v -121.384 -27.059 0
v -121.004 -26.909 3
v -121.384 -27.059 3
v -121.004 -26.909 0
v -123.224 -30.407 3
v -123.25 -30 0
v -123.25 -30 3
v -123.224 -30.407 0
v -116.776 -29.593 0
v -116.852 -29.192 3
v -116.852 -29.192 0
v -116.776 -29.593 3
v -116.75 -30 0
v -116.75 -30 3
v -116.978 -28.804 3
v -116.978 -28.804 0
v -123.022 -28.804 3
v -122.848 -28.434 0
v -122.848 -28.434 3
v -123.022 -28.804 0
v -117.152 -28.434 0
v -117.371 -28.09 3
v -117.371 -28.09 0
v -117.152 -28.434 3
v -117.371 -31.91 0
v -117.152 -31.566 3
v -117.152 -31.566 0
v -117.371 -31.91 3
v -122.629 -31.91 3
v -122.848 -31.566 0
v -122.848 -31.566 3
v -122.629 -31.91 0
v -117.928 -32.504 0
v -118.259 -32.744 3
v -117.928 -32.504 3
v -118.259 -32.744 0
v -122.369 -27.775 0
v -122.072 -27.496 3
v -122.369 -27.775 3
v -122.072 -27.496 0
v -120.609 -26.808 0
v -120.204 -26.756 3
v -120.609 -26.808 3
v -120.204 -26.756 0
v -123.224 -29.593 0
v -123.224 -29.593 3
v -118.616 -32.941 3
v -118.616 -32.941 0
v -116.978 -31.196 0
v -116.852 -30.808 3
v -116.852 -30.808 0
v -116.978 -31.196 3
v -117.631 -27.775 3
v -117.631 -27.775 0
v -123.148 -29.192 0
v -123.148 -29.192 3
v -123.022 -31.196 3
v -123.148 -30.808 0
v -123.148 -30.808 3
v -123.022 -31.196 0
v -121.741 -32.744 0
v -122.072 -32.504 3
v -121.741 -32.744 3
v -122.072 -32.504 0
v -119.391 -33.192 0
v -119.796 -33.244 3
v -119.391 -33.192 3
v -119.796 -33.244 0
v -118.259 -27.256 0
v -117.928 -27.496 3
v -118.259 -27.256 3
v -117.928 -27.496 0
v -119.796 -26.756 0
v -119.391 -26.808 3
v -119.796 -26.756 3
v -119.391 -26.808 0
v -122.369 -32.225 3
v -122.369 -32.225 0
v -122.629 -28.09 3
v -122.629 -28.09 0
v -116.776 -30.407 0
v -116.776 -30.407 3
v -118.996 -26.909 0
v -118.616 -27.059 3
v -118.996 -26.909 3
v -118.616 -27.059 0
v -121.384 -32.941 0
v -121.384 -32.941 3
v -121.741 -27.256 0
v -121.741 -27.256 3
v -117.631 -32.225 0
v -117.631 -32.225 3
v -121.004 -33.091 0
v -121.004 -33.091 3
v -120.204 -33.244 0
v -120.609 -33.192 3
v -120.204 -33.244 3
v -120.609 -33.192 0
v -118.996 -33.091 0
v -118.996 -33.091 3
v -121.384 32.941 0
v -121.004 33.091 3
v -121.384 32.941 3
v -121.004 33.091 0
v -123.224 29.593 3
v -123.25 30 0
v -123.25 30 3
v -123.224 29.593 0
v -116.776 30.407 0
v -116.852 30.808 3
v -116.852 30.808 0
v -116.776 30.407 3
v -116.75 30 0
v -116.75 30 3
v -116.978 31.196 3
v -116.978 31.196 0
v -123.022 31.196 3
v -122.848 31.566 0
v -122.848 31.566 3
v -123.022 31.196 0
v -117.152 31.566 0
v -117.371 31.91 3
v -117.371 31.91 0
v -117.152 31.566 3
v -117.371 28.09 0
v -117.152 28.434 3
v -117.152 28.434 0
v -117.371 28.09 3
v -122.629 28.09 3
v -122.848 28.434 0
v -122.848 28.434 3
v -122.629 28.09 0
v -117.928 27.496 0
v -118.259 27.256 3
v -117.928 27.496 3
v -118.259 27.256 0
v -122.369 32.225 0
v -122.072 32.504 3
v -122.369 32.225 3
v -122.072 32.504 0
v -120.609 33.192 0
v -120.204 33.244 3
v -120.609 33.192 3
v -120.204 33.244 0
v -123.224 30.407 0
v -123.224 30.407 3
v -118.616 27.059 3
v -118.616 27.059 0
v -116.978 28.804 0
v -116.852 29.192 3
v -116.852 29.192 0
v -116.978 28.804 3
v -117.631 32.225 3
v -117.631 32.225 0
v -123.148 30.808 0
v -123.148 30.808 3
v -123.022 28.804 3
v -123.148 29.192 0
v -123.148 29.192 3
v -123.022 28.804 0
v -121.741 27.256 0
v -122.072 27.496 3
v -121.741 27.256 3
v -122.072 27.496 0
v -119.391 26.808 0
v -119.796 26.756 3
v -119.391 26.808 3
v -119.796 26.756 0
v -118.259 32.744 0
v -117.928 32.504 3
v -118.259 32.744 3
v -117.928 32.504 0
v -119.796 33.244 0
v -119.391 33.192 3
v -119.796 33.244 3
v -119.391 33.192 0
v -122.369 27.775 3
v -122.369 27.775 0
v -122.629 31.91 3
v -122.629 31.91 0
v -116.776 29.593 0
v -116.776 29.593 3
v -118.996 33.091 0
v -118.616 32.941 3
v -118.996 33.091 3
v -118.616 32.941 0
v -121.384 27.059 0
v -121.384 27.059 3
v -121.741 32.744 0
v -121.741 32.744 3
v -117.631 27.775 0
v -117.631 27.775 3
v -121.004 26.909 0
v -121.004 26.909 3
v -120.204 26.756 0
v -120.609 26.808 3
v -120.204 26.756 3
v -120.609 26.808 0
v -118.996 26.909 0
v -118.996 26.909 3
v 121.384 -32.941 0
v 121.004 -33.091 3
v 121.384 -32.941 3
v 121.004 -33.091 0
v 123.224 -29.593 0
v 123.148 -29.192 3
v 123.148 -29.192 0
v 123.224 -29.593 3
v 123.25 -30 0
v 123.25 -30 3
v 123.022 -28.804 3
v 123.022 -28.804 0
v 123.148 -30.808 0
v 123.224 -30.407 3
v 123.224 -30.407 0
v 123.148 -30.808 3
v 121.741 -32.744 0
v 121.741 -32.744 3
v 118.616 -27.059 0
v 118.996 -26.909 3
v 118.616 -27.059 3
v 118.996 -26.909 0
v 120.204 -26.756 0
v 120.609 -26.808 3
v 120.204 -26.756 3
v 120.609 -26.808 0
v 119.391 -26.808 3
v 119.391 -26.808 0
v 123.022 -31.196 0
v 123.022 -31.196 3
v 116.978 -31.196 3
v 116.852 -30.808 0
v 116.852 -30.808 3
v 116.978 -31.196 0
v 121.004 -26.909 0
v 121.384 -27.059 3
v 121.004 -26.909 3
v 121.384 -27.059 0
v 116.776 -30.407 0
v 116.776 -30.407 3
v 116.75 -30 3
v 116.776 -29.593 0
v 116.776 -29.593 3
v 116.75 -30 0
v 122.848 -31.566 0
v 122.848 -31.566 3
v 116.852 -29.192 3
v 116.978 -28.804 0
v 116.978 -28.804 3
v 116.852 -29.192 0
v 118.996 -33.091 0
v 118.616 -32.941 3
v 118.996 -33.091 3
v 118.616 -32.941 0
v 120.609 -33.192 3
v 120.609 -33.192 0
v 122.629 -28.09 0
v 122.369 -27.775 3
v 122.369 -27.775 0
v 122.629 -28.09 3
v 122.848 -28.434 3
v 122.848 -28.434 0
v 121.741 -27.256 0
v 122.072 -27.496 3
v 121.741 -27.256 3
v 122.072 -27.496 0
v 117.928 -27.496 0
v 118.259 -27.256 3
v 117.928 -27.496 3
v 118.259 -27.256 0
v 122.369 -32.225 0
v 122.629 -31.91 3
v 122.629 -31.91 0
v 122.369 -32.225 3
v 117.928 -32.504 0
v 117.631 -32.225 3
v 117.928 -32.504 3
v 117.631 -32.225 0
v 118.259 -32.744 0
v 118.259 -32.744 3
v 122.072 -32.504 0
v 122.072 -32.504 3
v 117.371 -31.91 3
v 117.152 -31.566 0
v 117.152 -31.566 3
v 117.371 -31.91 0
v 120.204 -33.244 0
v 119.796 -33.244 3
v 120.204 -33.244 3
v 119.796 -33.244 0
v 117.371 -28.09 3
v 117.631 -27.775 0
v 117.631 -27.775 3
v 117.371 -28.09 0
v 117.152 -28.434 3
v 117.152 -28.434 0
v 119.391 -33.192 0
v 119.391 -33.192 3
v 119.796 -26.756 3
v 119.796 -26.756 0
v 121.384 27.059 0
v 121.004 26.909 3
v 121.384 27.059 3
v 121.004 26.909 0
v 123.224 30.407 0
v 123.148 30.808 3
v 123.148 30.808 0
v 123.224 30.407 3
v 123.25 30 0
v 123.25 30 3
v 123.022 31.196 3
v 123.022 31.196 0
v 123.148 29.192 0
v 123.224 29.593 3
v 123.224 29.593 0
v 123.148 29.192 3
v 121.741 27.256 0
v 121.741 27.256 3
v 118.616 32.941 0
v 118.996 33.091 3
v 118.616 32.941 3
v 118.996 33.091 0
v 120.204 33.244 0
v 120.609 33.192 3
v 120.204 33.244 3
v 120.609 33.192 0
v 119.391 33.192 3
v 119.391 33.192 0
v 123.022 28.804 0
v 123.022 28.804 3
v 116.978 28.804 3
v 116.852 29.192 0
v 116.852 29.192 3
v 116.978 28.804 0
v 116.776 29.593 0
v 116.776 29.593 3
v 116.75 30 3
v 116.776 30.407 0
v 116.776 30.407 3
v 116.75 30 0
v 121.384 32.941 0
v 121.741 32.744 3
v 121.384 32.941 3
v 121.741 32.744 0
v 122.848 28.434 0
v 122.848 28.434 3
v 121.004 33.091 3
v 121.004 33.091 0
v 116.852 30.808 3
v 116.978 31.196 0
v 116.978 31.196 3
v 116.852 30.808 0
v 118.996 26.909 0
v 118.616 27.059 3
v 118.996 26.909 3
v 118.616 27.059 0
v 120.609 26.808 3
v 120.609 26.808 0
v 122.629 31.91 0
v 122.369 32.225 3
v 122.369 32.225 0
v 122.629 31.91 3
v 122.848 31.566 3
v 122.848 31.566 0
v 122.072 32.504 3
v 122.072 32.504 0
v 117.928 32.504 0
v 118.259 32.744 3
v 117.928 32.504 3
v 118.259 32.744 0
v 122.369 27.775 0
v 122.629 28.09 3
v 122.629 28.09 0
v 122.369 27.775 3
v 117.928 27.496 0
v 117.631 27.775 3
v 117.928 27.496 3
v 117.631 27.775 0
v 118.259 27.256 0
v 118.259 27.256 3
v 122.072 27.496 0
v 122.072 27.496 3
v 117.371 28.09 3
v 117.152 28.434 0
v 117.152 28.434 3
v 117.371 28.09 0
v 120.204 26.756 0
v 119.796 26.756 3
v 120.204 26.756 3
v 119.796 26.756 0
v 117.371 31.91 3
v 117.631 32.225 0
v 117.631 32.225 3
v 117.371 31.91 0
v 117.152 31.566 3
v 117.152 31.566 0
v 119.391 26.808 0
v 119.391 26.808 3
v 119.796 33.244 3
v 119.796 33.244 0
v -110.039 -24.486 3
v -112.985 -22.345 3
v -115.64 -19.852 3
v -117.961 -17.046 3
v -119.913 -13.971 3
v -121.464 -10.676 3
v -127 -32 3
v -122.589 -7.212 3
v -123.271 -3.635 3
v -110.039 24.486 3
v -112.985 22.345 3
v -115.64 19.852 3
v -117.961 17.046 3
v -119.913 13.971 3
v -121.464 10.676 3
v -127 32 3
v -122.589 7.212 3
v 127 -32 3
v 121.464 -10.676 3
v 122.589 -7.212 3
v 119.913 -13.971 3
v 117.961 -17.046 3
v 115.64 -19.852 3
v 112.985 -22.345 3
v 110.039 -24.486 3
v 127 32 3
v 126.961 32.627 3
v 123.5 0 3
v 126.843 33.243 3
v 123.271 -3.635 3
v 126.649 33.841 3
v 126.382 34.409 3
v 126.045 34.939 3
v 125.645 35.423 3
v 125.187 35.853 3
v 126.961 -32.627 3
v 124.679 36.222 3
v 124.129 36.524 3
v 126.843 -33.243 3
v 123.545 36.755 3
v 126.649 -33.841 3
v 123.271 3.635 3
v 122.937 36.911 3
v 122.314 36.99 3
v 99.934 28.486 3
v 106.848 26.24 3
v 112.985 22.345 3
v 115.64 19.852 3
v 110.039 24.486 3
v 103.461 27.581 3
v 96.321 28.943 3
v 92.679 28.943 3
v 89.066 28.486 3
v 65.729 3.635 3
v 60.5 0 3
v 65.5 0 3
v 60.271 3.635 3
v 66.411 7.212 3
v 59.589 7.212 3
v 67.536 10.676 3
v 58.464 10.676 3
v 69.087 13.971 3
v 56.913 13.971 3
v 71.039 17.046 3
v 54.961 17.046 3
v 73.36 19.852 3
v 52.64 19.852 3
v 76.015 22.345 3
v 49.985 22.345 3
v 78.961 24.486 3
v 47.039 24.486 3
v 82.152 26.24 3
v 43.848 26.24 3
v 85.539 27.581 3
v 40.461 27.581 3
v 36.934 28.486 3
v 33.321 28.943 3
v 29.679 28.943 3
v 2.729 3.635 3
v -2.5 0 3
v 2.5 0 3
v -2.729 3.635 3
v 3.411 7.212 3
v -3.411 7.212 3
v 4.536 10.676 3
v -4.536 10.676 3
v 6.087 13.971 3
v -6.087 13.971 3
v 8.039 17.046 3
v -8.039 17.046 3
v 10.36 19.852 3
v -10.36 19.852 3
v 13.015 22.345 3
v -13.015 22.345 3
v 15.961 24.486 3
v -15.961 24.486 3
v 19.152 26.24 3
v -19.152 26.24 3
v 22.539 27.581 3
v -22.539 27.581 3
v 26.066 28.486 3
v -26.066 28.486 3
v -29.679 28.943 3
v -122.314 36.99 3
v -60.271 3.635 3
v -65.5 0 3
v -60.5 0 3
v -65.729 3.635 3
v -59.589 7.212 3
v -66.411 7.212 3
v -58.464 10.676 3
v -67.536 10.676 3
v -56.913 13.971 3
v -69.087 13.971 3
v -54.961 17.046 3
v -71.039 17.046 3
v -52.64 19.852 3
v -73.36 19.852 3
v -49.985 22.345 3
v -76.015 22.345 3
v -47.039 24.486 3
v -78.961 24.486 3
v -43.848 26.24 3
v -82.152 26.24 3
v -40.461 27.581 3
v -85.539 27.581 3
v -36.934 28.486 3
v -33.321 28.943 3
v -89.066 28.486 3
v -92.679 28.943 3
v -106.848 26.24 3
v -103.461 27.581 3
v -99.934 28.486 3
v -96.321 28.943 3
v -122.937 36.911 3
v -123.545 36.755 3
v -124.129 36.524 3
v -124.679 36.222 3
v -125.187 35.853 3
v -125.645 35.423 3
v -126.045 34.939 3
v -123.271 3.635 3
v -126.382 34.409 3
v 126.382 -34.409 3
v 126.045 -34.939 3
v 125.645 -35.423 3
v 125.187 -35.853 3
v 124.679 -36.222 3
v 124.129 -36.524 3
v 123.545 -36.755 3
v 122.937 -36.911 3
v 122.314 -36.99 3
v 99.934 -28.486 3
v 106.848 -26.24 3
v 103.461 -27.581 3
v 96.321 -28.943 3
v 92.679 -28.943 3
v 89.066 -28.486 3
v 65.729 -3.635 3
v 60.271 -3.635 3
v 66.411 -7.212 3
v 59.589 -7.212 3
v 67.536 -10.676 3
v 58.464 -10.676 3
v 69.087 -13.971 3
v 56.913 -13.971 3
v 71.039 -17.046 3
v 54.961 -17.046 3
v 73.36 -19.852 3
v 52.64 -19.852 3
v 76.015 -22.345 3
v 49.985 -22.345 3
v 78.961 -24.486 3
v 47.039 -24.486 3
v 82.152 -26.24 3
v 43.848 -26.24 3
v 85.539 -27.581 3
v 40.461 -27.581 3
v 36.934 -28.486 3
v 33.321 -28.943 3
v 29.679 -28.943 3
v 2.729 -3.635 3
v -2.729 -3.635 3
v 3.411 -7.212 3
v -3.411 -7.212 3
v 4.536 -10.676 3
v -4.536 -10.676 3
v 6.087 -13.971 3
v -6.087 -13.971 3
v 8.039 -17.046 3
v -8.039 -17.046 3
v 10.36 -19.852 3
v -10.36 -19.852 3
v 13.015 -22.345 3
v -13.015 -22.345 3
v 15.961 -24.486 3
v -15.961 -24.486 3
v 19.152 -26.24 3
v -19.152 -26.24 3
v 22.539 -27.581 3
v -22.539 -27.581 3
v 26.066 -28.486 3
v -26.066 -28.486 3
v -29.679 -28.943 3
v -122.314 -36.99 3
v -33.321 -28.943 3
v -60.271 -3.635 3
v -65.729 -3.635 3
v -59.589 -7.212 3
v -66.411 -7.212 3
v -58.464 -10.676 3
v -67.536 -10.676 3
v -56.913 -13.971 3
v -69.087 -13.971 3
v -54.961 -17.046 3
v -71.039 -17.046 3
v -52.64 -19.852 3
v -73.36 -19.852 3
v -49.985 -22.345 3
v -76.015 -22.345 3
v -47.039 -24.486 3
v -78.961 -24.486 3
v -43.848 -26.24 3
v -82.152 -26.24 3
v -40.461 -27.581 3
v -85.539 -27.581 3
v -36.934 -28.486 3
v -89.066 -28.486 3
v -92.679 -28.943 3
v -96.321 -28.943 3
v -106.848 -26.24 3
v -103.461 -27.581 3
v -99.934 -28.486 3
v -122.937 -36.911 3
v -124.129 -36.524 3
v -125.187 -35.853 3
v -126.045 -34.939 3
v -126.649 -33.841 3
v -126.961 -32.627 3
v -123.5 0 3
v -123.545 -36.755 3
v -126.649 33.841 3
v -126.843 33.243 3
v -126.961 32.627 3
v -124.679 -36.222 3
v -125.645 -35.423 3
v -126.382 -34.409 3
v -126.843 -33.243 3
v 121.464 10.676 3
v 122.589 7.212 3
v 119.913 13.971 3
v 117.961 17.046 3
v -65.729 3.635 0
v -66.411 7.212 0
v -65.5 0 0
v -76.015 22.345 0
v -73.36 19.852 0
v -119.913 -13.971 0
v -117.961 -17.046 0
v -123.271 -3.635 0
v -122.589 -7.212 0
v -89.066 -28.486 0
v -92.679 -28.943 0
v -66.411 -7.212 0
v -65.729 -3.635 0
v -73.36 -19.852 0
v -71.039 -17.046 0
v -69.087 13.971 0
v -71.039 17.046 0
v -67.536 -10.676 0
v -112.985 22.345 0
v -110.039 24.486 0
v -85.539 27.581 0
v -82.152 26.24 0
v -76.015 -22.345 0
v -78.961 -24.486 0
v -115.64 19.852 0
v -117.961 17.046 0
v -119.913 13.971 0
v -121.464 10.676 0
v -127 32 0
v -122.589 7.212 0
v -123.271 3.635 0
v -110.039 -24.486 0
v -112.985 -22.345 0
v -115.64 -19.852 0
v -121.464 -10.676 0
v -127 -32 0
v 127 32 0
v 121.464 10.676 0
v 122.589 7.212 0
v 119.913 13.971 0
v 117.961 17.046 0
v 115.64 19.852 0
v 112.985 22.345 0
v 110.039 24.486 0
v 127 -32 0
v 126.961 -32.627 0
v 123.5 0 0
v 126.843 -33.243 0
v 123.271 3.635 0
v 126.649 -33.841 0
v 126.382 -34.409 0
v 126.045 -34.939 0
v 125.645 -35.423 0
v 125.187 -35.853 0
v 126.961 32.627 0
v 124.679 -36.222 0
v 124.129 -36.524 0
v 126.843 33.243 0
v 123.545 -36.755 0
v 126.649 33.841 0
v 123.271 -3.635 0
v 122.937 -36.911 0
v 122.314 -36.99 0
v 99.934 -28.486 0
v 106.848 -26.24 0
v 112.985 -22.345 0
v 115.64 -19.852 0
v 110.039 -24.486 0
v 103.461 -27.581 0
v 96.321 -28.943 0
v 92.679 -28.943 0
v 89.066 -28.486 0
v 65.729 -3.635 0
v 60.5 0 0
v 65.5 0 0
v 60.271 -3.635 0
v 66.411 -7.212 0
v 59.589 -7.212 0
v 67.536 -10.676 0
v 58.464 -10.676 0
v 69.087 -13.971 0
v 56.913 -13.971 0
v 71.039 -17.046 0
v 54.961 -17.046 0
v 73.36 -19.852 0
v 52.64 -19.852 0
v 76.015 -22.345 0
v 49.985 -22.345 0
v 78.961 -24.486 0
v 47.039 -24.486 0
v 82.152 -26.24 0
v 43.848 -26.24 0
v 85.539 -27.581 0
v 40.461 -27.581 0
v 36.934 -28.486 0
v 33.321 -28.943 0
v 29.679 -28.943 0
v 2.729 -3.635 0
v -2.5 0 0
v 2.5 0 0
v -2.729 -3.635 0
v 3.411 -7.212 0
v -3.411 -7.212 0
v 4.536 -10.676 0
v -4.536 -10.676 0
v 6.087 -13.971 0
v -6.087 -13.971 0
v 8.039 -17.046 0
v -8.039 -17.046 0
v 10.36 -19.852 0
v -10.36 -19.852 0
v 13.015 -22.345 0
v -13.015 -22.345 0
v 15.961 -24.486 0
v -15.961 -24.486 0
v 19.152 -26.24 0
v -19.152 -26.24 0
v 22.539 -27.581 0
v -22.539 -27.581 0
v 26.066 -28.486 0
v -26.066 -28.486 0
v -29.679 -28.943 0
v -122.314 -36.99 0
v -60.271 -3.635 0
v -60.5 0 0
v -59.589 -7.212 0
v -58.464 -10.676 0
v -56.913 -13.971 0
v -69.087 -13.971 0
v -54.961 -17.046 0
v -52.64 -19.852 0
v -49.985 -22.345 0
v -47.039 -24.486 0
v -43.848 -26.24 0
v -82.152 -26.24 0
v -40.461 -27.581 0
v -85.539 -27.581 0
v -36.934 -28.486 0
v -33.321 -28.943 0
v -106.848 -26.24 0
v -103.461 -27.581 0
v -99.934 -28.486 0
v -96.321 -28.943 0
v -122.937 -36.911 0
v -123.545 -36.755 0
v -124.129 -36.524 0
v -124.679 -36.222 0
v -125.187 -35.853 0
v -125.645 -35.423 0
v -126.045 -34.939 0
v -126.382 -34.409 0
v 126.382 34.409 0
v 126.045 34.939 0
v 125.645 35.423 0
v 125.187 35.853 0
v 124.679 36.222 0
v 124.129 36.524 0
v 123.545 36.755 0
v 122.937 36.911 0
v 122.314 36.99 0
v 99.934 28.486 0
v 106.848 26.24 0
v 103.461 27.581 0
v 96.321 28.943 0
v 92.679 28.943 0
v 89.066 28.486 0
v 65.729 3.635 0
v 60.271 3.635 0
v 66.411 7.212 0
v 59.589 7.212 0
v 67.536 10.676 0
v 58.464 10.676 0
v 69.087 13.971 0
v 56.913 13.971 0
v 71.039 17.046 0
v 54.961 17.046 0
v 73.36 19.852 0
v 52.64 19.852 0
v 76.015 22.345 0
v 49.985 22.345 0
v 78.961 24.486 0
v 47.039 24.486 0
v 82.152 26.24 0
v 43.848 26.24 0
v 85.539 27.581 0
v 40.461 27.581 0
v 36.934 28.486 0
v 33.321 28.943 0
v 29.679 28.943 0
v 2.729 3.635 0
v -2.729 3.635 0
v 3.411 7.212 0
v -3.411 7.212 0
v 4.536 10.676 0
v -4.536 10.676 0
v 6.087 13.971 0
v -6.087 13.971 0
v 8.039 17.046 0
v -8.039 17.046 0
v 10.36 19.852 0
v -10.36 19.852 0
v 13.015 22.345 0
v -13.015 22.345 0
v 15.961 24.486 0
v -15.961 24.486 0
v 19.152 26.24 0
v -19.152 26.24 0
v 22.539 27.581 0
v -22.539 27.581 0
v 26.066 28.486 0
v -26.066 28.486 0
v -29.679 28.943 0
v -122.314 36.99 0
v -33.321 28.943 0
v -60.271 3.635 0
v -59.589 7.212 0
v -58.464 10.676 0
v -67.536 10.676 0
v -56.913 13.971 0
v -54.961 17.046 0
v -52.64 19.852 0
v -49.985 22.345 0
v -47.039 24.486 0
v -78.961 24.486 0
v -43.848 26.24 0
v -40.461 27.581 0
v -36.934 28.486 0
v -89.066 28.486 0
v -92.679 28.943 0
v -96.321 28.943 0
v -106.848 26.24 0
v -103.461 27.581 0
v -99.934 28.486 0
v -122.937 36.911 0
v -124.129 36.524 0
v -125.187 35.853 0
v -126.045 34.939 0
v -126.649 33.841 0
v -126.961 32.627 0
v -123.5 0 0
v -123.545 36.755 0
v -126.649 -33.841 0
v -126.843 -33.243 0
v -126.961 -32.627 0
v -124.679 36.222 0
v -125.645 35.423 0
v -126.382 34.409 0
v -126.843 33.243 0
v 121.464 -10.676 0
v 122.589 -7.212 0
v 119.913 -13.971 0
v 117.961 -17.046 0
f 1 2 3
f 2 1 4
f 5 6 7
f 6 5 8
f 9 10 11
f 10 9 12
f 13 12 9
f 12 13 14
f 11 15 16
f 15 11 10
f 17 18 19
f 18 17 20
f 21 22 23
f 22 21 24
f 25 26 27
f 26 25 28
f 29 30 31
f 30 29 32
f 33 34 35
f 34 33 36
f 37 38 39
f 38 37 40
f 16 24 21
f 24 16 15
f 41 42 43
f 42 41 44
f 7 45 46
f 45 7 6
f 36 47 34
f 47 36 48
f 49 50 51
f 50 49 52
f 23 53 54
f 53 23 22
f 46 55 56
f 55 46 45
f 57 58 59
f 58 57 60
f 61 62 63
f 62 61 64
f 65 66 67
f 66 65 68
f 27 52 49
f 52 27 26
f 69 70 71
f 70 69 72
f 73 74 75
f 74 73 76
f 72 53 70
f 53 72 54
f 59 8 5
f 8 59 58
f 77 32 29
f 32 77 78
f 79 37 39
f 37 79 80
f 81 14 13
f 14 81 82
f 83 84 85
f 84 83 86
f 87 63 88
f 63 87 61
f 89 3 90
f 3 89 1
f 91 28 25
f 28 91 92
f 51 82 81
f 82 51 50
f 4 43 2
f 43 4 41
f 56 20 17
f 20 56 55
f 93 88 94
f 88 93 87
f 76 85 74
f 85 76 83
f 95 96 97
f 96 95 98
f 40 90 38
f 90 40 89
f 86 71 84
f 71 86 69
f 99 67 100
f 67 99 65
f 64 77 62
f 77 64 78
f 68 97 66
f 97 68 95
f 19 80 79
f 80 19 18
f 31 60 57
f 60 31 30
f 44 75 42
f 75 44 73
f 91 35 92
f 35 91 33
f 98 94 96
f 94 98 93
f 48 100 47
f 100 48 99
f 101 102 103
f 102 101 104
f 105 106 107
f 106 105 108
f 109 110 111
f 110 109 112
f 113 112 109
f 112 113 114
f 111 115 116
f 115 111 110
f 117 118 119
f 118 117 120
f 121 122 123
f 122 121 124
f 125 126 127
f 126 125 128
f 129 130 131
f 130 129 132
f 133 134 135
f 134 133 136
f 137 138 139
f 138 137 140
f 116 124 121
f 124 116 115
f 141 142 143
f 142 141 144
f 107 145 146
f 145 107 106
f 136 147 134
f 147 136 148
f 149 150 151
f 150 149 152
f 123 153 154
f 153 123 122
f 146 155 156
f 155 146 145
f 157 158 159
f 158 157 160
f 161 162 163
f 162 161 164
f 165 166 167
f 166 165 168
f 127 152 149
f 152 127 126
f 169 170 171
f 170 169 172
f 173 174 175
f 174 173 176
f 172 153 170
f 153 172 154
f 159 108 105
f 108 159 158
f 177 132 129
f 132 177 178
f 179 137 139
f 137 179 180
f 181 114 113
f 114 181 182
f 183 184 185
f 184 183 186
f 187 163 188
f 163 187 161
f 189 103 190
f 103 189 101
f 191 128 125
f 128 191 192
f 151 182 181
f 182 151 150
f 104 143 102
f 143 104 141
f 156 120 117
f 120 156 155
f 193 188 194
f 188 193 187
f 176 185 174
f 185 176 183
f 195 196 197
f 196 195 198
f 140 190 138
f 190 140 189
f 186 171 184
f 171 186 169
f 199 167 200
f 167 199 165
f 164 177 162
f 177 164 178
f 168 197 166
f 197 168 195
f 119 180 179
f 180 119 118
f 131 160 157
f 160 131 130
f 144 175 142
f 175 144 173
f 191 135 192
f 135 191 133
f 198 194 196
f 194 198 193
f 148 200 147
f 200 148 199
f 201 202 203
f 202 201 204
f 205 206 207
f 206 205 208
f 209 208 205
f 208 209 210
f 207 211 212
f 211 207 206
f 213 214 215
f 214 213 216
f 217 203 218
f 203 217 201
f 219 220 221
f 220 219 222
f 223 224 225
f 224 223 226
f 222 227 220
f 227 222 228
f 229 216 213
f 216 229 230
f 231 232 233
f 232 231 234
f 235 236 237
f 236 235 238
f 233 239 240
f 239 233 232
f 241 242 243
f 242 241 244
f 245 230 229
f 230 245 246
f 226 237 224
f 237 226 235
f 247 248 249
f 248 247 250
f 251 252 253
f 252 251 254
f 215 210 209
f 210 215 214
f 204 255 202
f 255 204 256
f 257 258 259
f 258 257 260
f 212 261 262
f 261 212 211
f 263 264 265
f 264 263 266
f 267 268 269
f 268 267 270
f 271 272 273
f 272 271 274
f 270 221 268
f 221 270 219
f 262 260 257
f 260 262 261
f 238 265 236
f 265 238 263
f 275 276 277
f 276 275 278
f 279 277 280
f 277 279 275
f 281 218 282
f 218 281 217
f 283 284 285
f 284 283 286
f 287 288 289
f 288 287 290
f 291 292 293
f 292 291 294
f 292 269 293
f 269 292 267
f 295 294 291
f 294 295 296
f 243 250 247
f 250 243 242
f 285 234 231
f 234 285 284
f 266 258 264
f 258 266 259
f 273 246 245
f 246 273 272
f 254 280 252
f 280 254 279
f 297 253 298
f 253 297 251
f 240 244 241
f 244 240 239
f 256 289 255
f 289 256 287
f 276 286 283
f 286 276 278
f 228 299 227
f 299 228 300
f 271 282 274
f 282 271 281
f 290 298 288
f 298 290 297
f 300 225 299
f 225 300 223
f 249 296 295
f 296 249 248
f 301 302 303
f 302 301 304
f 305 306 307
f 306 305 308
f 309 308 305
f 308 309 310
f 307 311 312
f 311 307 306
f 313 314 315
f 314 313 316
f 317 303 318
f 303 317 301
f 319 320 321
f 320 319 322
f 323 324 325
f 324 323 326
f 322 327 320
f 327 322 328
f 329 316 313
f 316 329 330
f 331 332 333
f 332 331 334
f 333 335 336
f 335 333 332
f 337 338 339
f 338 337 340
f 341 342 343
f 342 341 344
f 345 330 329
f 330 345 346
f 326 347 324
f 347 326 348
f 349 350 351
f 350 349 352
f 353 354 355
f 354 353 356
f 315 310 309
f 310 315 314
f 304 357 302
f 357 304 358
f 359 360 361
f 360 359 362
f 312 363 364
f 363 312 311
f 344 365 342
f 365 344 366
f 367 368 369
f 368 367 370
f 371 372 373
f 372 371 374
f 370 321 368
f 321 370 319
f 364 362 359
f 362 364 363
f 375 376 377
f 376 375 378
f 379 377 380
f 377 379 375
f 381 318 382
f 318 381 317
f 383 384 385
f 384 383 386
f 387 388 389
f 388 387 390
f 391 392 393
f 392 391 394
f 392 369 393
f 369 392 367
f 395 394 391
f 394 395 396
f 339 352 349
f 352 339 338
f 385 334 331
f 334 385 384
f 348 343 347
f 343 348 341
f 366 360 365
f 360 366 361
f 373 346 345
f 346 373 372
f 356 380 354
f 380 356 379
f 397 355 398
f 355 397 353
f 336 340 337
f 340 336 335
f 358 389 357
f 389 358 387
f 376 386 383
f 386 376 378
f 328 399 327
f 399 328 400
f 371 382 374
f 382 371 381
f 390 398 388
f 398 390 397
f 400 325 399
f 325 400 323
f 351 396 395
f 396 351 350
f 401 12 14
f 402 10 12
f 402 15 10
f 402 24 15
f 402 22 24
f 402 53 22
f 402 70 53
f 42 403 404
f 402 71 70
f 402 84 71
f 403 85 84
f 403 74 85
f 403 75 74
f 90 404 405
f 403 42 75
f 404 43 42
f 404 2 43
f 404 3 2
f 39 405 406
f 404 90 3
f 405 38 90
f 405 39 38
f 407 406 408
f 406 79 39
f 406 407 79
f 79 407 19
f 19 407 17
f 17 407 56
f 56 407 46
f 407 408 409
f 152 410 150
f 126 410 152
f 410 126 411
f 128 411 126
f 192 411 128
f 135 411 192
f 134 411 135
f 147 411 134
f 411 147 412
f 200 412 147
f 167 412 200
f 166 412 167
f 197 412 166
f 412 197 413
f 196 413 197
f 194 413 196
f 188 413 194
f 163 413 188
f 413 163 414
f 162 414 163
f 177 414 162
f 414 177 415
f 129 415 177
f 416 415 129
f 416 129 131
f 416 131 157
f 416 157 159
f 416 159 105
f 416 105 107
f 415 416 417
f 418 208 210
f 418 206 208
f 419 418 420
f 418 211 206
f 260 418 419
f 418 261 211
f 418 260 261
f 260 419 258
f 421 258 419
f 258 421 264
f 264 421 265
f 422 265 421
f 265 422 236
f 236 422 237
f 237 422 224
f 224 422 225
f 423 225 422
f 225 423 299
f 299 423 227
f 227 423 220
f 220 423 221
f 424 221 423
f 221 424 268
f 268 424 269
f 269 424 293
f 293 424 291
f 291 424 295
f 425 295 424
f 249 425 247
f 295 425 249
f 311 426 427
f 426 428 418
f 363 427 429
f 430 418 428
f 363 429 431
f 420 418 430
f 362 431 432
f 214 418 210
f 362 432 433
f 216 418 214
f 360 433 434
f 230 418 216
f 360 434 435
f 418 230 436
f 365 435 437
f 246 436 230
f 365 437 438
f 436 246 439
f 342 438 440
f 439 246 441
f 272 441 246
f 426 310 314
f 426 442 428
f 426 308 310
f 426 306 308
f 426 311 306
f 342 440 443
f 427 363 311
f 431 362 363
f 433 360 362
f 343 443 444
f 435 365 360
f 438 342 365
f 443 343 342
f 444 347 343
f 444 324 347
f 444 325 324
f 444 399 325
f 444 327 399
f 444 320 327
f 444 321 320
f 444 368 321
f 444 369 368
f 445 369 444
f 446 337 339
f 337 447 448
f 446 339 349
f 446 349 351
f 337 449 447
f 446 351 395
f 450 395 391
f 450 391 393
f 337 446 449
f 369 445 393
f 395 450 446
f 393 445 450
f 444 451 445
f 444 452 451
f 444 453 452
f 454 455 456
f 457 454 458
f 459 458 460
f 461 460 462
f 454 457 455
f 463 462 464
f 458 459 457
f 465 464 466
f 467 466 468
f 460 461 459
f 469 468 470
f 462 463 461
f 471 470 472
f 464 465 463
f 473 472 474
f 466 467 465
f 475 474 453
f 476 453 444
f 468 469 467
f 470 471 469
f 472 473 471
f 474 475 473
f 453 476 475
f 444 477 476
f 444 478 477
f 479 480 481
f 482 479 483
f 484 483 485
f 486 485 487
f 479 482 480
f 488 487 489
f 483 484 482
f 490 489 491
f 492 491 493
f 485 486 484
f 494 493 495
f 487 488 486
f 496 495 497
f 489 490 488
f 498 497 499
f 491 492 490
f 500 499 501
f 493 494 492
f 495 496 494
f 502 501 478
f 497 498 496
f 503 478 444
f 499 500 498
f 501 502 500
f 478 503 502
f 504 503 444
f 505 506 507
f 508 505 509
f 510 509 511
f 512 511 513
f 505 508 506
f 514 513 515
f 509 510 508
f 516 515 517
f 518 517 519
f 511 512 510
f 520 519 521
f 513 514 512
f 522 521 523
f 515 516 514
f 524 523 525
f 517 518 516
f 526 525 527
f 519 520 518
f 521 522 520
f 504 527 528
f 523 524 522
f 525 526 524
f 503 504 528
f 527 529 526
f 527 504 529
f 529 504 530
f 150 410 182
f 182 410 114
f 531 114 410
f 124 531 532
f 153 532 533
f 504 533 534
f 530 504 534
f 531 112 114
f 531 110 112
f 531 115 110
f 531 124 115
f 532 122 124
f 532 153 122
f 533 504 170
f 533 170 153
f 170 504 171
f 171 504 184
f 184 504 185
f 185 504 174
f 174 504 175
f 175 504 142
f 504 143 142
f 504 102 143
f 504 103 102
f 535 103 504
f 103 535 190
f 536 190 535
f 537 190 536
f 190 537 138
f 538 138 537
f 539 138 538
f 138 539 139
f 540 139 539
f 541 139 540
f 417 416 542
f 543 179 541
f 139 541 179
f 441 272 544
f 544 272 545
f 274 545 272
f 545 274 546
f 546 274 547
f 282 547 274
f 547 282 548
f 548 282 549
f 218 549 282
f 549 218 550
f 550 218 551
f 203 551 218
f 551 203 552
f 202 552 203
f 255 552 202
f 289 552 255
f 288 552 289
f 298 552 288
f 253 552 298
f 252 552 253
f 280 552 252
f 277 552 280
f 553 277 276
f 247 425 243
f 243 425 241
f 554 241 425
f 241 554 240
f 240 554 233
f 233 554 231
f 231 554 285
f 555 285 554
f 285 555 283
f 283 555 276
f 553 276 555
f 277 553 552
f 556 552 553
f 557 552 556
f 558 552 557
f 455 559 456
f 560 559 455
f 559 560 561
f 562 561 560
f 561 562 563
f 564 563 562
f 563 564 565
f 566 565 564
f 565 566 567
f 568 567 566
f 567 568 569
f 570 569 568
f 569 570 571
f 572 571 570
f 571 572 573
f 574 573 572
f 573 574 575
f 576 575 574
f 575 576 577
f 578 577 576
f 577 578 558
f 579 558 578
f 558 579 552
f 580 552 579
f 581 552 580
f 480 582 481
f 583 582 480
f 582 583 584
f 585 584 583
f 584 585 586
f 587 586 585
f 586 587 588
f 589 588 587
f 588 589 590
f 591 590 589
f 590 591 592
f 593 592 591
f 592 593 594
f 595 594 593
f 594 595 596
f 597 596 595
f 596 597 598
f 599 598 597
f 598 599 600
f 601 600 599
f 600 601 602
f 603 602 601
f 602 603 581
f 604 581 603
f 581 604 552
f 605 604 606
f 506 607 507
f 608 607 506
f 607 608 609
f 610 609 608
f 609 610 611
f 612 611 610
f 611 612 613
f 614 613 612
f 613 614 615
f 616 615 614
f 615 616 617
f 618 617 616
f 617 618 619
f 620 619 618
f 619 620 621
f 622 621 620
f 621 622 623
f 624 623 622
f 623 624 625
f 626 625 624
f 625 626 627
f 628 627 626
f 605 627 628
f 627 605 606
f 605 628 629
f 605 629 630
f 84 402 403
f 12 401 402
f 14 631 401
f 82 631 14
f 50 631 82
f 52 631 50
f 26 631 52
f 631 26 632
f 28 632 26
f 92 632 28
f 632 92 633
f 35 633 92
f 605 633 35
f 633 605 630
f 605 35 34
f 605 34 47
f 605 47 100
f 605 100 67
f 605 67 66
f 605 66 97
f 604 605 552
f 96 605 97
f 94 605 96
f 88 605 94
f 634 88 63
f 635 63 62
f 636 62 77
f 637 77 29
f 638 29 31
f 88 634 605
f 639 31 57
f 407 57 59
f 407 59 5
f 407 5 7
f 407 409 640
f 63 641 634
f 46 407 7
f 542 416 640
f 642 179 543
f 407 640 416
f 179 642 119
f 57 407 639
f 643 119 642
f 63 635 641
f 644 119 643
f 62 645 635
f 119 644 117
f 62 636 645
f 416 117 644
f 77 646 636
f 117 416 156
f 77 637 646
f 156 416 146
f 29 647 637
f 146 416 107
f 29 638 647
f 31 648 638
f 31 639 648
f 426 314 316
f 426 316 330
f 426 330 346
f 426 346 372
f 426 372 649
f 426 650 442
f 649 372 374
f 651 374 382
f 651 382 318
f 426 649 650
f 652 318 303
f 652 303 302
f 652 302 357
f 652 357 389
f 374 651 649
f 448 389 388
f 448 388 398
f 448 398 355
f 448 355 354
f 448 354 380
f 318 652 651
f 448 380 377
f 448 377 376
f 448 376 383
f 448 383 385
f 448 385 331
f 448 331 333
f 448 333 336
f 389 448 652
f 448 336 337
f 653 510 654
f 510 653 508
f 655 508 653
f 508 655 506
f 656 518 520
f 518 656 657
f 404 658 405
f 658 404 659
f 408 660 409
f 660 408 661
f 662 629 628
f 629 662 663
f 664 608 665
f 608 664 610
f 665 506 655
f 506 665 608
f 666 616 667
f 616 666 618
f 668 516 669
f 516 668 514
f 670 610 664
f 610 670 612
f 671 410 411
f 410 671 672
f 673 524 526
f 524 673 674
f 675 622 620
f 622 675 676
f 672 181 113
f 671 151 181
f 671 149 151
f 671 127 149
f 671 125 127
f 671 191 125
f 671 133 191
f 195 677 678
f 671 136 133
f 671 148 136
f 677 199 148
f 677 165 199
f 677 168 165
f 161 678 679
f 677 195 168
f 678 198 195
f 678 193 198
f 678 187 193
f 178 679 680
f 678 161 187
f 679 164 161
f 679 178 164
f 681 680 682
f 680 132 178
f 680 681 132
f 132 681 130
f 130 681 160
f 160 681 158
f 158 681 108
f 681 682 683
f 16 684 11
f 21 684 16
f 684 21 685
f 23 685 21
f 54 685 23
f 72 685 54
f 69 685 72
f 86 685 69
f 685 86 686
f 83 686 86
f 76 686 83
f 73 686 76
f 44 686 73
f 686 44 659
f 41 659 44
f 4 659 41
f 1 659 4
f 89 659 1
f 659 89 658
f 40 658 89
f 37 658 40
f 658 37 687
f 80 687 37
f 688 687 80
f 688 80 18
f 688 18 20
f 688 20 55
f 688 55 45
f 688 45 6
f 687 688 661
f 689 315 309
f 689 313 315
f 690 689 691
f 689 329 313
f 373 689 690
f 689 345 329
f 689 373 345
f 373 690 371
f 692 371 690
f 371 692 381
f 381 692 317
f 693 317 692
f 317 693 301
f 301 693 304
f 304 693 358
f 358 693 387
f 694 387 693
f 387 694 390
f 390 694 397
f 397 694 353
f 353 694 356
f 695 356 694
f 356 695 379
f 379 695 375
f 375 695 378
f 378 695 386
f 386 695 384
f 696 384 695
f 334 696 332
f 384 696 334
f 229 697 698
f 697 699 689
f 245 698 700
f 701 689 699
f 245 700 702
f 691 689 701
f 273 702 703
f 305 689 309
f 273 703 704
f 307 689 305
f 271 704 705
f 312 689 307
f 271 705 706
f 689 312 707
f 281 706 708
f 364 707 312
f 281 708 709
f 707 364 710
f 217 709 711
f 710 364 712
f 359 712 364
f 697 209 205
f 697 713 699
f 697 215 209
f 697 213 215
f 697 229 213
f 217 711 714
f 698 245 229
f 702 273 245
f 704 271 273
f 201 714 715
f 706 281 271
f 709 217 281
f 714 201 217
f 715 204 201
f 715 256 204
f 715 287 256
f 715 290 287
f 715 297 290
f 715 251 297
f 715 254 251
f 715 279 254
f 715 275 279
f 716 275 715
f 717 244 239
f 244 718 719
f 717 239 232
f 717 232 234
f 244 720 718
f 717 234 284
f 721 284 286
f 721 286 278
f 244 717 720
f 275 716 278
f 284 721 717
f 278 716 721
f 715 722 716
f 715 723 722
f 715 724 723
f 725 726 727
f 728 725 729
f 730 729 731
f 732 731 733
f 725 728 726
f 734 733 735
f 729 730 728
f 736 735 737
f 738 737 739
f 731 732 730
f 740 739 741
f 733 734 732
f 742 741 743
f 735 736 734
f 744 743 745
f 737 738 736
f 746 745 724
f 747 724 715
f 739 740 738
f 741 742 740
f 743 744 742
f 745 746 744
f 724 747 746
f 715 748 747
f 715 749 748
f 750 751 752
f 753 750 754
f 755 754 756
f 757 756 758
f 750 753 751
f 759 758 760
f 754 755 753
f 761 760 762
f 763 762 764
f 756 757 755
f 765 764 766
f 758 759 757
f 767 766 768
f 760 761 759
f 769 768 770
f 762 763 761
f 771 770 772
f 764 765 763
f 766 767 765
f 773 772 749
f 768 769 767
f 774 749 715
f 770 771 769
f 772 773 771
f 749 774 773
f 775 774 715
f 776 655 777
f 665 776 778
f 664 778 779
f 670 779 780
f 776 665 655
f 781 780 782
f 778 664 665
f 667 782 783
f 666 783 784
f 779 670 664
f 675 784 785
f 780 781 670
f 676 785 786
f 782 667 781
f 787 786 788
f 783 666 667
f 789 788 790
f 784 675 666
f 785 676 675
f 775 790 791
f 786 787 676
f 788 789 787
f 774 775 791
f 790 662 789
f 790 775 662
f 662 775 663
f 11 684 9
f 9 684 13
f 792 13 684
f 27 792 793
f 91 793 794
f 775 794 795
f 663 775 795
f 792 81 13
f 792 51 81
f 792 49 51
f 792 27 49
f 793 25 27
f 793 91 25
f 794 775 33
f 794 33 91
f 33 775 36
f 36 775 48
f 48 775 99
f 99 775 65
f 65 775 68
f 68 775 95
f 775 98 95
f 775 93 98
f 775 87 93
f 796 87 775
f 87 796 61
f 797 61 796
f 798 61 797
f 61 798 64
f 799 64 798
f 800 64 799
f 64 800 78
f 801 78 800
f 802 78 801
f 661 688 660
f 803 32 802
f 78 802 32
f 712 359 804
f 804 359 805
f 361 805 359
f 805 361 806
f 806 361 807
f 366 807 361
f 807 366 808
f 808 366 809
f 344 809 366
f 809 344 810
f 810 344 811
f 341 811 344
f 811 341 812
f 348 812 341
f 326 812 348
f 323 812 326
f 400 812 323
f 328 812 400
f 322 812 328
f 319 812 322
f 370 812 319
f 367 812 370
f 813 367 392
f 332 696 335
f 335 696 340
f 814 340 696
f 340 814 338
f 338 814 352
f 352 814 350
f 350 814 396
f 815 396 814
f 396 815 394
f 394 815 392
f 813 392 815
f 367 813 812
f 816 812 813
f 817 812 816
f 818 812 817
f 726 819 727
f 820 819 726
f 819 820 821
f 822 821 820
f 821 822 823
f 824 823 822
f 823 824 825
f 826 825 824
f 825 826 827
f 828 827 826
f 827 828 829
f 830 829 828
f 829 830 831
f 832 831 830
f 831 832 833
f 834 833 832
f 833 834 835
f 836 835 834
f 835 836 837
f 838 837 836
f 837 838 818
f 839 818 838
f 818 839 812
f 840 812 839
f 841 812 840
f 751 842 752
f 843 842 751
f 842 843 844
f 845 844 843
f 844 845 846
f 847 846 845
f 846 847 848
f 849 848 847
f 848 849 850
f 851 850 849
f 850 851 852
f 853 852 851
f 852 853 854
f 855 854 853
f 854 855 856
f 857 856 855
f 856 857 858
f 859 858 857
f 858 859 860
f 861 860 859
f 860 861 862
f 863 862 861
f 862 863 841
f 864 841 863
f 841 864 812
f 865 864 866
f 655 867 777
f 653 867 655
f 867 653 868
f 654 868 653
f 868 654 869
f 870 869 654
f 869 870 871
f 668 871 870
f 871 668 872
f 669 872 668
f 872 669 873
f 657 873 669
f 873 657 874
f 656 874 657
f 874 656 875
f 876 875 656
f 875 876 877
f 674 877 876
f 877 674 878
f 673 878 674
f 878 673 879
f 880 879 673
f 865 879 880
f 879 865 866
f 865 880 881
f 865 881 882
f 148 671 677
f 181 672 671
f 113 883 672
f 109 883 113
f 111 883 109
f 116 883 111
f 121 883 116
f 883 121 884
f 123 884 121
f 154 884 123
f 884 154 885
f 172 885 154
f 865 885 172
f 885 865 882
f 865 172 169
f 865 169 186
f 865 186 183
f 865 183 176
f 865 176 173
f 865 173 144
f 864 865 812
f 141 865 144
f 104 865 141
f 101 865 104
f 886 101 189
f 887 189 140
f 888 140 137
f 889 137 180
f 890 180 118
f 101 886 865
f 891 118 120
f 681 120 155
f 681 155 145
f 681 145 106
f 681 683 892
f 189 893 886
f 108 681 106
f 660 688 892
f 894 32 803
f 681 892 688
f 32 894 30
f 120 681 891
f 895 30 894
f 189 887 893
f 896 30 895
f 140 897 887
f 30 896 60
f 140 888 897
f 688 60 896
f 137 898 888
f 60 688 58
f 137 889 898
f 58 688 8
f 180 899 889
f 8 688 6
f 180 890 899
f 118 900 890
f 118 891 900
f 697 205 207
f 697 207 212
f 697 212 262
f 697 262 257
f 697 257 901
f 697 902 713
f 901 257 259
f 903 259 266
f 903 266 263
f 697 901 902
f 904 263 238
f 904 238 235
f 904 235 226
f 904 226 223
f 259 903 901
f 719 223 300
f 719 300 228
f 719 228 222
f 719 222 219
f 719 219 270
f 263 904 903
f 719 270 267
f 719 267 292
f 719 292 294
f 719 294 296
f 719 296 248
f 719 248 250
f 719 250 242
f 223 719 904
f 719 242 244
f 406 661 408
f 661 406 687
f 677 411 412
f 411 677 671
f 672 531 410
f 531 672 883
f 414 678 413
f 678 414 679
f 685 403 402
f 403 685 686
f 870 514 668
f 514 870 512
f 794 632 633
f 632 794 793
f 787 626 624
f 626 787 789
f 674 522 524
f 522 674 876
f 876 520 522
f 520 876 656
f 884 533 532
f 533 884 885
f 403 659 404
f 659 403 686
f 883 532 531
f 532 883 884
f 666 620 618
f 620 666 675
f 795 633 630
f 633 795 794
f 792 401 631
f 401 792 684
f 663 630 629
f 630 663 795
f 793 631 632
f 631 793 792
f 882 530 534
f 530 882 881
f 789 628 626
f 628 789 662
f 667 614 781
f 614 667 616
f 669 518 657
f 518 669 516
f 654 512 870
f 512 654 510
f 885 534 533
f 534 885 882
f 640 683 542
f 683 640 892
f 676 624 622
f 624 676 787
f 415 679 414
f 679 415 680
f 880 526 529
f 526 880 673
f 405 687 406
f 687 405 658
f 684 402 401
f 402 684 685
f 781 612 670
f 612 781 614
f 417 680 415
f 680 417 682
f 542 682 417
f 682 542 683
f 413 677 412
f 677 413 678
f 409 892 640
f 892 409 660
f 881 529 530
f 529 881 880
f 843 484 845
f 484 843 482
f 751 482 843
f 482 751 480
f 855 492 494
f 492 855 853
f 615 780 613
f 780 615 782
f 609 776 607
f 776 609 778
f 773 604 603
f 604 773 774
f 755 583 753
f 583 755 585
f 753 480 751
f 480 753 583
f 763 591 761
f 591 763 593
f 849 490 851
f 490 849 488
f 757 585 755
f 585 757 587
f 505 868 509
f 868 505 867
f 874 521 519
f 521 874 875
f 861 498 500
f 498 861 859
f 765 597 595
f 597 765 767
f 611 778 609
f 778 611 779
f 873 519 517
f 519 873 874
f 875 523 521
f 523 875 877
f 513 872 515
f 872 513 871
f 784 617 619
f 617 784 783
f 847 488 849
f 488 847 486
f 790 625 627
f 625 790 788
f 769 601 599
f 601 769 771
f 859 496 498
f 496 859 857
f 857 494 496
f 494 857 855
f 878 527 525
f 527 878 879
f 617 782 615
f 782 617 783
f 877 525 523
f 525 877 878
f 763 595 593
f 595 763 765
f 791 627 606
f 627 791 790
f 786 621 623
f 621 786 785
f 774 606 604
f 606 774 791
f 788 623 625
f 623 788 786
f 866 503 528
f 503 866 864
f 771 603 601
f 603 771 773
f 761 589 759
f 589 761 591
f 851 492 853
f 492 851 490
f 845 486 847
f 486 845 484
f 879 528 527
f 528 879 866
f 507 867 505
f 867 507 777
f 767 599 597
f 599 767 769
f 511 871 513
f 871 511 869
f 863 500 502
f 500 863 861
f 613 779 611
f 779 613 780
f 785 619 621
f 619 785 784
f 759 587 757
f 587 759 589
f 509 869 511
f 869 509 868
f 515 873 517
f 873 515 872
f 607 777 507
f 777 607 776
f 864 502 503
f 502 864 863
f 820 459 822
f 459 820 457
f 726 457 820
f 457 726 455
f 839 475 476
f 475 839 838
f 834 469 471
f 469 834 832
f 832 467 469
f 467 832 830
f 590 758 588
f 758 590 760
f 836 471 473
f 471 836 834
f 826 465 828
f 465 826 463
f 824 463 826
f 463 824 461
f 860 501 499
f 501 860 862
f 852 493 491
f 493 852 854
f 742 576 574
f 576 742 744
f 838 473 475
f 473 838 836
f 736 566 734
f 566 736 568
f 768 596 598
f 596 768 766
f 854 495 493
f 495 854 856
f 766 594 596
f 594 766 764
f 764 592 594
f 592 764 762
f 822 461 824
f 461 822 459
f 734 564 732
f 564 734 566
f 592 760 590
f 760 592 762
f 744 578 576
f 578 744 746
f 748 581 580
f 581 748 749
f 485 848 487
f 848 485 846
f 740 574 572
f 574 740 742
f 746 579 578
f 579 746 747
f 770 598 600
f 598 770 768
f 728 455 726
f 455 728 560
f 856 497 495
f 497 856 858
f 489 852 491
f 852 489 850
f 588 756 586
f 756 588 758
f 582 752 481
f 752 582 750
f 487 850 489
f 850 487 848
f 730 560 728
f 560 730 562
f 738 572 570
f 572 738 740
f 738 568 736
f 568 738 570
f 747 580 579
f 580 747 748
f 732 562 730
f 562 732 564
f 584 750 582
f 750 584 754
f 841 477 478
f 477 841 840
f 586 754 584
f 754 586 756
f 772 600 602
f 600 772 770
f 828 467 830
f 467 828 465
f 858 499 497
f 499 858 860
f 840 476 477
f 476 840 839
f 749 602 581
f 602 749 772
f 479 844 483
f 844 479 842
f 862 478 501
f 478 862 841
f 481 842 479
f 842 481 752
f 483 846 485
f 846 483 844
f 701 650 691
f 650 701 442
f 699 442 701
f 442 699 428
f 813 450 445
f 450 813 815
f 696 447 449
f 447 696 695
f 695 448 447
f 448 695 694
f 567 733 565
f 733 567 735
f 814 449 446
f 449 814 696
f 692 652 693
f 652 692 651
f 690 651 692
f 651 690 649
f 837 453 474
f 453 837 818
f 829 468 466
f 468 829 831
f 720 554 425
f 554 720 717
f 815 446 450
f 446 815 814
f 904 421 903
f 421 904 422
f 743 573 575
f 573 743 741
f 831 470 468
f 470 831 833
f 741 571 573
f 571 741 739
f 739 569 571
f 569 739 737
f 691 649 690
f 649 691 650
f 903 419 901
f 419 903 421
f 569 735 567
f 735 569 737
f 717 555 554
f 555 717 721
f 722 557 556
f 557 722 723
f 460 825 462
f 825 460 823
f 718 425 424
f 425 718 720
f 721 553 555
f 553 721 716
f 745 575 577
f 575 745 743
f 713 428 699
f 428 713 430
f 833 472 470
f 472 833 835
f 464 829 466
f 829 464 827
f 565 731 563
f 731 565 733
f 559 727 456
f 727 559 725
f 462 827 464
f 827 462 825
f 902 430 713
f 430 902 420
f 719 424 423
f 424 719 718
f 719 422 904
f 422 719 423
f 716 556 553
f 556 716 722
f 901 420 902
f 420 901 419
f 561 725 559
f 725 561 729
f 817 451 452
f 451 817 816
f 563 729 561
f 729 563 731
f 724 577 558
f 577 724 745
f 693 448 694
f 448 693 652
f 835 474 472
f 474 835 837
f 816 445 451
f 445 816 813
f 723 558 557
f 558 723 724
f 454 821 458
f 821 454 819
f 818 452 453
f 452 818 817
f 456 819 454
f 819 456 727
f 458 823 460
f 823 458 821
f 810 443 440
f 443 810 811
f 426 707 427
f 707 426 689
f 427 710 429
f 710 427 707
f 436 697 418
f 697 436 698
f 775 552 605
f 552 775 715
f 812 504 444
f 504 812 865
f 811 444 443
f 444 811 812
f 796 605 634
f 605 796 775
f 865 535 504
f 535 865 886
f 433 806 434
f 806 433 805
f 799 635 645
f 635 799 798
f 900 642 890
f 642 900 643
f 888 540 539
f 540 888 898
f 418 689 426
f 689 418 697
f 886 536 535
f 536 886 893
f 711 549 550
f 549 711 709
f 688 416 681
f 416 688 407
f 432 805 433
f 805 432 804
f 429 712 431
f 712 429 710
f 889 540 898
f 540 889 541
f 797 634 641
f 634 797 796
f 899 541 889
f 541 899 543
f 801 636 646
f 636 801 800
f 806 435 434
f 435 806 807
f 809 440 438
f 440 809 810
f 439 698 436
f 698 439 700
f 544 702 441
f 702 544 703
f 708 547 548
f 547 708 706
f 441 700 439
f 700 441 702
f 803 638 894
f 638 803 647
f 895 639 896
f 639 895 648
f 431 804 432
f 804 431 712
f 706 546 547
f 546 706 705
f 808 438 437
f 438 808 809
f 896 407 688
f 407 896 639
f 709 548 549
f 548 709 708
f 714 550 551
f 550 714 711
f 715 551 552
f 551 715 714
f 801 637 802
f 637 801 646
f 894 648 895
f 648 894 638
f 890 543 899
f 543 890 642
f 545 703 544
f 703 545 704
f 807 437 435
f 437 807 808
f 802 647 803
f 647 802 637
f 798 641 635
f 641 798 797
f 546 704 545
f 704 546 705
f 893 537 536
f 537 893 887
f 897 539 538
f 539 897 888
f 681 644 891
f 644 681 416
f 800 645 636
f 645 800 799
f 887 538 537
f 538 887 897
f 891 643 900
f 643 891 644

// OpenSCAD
$fn = 50;

difference() {
	union() {
		hull() {
			translate(v = [-122.0, 32.0, 0]) {
				cylinder(h = 3, r = 5);
			}
			translate(v = [122.0, 32.0, 0]) {
				cylinder(h = 3, r = 5);
			}
			translate(v = [-122.0, -32.0, 0]) {
				cylinder(h = 3, r = 5);
			}
			translate(v = [122.0, -32.0, 0]) {
				cylinder(h = 3, r = 5);
			}
		}
	}
	union() {
		translate(v = [-120.0, -30.0, -100.0]) {
			cylinder(h = 200, r = 3.25);
		}
		translate(v = [-120.0, 30.0, -100.0]) {
			cylinder(h = 200, r = 3.25);
		}
		translate(v = [120.0, -30.0, -100.0]) {
			cylinder(h = 200, r = 3.25);
		}
		translate(v = [120.0, 30.0, -100.0]) {
			cylinder(h = 200, r = 3.25);
		}
		translate(v = [-120.0, -30.0, -100.0]) {
			cylinder(h = 200, r = 1.8);
		}
		translate(v = [-120.0, 30.0, -100.0]) {
			cylinder(h = 200, r = 1.8);
		}
		translate(v = [120.0, -30.0, -100.0]) {
			cylinder(h = 200, r = 1.8);
		}
		translate(v = [120.0, 30.0, -100.0]) {
			cylinder(h = 200, r = 1.8);
		}
		translate(v = [-94.5, 0, 0.0]) {
			cylinder(h = 3, r = 29.0);
		}
		translate(v = [-31.5, 0, 0.0]) {
			cylinder(h = 3, r = 29.0);
		}
		translate(v = [31.5, 0, 0.0]) {
			cylinder(h = 3, r = 29.0);
		}
		translate(v = [94.5, 0, 0.0]) {
			cylinder(h = 3, r = 29.0);
		}
	}
}
